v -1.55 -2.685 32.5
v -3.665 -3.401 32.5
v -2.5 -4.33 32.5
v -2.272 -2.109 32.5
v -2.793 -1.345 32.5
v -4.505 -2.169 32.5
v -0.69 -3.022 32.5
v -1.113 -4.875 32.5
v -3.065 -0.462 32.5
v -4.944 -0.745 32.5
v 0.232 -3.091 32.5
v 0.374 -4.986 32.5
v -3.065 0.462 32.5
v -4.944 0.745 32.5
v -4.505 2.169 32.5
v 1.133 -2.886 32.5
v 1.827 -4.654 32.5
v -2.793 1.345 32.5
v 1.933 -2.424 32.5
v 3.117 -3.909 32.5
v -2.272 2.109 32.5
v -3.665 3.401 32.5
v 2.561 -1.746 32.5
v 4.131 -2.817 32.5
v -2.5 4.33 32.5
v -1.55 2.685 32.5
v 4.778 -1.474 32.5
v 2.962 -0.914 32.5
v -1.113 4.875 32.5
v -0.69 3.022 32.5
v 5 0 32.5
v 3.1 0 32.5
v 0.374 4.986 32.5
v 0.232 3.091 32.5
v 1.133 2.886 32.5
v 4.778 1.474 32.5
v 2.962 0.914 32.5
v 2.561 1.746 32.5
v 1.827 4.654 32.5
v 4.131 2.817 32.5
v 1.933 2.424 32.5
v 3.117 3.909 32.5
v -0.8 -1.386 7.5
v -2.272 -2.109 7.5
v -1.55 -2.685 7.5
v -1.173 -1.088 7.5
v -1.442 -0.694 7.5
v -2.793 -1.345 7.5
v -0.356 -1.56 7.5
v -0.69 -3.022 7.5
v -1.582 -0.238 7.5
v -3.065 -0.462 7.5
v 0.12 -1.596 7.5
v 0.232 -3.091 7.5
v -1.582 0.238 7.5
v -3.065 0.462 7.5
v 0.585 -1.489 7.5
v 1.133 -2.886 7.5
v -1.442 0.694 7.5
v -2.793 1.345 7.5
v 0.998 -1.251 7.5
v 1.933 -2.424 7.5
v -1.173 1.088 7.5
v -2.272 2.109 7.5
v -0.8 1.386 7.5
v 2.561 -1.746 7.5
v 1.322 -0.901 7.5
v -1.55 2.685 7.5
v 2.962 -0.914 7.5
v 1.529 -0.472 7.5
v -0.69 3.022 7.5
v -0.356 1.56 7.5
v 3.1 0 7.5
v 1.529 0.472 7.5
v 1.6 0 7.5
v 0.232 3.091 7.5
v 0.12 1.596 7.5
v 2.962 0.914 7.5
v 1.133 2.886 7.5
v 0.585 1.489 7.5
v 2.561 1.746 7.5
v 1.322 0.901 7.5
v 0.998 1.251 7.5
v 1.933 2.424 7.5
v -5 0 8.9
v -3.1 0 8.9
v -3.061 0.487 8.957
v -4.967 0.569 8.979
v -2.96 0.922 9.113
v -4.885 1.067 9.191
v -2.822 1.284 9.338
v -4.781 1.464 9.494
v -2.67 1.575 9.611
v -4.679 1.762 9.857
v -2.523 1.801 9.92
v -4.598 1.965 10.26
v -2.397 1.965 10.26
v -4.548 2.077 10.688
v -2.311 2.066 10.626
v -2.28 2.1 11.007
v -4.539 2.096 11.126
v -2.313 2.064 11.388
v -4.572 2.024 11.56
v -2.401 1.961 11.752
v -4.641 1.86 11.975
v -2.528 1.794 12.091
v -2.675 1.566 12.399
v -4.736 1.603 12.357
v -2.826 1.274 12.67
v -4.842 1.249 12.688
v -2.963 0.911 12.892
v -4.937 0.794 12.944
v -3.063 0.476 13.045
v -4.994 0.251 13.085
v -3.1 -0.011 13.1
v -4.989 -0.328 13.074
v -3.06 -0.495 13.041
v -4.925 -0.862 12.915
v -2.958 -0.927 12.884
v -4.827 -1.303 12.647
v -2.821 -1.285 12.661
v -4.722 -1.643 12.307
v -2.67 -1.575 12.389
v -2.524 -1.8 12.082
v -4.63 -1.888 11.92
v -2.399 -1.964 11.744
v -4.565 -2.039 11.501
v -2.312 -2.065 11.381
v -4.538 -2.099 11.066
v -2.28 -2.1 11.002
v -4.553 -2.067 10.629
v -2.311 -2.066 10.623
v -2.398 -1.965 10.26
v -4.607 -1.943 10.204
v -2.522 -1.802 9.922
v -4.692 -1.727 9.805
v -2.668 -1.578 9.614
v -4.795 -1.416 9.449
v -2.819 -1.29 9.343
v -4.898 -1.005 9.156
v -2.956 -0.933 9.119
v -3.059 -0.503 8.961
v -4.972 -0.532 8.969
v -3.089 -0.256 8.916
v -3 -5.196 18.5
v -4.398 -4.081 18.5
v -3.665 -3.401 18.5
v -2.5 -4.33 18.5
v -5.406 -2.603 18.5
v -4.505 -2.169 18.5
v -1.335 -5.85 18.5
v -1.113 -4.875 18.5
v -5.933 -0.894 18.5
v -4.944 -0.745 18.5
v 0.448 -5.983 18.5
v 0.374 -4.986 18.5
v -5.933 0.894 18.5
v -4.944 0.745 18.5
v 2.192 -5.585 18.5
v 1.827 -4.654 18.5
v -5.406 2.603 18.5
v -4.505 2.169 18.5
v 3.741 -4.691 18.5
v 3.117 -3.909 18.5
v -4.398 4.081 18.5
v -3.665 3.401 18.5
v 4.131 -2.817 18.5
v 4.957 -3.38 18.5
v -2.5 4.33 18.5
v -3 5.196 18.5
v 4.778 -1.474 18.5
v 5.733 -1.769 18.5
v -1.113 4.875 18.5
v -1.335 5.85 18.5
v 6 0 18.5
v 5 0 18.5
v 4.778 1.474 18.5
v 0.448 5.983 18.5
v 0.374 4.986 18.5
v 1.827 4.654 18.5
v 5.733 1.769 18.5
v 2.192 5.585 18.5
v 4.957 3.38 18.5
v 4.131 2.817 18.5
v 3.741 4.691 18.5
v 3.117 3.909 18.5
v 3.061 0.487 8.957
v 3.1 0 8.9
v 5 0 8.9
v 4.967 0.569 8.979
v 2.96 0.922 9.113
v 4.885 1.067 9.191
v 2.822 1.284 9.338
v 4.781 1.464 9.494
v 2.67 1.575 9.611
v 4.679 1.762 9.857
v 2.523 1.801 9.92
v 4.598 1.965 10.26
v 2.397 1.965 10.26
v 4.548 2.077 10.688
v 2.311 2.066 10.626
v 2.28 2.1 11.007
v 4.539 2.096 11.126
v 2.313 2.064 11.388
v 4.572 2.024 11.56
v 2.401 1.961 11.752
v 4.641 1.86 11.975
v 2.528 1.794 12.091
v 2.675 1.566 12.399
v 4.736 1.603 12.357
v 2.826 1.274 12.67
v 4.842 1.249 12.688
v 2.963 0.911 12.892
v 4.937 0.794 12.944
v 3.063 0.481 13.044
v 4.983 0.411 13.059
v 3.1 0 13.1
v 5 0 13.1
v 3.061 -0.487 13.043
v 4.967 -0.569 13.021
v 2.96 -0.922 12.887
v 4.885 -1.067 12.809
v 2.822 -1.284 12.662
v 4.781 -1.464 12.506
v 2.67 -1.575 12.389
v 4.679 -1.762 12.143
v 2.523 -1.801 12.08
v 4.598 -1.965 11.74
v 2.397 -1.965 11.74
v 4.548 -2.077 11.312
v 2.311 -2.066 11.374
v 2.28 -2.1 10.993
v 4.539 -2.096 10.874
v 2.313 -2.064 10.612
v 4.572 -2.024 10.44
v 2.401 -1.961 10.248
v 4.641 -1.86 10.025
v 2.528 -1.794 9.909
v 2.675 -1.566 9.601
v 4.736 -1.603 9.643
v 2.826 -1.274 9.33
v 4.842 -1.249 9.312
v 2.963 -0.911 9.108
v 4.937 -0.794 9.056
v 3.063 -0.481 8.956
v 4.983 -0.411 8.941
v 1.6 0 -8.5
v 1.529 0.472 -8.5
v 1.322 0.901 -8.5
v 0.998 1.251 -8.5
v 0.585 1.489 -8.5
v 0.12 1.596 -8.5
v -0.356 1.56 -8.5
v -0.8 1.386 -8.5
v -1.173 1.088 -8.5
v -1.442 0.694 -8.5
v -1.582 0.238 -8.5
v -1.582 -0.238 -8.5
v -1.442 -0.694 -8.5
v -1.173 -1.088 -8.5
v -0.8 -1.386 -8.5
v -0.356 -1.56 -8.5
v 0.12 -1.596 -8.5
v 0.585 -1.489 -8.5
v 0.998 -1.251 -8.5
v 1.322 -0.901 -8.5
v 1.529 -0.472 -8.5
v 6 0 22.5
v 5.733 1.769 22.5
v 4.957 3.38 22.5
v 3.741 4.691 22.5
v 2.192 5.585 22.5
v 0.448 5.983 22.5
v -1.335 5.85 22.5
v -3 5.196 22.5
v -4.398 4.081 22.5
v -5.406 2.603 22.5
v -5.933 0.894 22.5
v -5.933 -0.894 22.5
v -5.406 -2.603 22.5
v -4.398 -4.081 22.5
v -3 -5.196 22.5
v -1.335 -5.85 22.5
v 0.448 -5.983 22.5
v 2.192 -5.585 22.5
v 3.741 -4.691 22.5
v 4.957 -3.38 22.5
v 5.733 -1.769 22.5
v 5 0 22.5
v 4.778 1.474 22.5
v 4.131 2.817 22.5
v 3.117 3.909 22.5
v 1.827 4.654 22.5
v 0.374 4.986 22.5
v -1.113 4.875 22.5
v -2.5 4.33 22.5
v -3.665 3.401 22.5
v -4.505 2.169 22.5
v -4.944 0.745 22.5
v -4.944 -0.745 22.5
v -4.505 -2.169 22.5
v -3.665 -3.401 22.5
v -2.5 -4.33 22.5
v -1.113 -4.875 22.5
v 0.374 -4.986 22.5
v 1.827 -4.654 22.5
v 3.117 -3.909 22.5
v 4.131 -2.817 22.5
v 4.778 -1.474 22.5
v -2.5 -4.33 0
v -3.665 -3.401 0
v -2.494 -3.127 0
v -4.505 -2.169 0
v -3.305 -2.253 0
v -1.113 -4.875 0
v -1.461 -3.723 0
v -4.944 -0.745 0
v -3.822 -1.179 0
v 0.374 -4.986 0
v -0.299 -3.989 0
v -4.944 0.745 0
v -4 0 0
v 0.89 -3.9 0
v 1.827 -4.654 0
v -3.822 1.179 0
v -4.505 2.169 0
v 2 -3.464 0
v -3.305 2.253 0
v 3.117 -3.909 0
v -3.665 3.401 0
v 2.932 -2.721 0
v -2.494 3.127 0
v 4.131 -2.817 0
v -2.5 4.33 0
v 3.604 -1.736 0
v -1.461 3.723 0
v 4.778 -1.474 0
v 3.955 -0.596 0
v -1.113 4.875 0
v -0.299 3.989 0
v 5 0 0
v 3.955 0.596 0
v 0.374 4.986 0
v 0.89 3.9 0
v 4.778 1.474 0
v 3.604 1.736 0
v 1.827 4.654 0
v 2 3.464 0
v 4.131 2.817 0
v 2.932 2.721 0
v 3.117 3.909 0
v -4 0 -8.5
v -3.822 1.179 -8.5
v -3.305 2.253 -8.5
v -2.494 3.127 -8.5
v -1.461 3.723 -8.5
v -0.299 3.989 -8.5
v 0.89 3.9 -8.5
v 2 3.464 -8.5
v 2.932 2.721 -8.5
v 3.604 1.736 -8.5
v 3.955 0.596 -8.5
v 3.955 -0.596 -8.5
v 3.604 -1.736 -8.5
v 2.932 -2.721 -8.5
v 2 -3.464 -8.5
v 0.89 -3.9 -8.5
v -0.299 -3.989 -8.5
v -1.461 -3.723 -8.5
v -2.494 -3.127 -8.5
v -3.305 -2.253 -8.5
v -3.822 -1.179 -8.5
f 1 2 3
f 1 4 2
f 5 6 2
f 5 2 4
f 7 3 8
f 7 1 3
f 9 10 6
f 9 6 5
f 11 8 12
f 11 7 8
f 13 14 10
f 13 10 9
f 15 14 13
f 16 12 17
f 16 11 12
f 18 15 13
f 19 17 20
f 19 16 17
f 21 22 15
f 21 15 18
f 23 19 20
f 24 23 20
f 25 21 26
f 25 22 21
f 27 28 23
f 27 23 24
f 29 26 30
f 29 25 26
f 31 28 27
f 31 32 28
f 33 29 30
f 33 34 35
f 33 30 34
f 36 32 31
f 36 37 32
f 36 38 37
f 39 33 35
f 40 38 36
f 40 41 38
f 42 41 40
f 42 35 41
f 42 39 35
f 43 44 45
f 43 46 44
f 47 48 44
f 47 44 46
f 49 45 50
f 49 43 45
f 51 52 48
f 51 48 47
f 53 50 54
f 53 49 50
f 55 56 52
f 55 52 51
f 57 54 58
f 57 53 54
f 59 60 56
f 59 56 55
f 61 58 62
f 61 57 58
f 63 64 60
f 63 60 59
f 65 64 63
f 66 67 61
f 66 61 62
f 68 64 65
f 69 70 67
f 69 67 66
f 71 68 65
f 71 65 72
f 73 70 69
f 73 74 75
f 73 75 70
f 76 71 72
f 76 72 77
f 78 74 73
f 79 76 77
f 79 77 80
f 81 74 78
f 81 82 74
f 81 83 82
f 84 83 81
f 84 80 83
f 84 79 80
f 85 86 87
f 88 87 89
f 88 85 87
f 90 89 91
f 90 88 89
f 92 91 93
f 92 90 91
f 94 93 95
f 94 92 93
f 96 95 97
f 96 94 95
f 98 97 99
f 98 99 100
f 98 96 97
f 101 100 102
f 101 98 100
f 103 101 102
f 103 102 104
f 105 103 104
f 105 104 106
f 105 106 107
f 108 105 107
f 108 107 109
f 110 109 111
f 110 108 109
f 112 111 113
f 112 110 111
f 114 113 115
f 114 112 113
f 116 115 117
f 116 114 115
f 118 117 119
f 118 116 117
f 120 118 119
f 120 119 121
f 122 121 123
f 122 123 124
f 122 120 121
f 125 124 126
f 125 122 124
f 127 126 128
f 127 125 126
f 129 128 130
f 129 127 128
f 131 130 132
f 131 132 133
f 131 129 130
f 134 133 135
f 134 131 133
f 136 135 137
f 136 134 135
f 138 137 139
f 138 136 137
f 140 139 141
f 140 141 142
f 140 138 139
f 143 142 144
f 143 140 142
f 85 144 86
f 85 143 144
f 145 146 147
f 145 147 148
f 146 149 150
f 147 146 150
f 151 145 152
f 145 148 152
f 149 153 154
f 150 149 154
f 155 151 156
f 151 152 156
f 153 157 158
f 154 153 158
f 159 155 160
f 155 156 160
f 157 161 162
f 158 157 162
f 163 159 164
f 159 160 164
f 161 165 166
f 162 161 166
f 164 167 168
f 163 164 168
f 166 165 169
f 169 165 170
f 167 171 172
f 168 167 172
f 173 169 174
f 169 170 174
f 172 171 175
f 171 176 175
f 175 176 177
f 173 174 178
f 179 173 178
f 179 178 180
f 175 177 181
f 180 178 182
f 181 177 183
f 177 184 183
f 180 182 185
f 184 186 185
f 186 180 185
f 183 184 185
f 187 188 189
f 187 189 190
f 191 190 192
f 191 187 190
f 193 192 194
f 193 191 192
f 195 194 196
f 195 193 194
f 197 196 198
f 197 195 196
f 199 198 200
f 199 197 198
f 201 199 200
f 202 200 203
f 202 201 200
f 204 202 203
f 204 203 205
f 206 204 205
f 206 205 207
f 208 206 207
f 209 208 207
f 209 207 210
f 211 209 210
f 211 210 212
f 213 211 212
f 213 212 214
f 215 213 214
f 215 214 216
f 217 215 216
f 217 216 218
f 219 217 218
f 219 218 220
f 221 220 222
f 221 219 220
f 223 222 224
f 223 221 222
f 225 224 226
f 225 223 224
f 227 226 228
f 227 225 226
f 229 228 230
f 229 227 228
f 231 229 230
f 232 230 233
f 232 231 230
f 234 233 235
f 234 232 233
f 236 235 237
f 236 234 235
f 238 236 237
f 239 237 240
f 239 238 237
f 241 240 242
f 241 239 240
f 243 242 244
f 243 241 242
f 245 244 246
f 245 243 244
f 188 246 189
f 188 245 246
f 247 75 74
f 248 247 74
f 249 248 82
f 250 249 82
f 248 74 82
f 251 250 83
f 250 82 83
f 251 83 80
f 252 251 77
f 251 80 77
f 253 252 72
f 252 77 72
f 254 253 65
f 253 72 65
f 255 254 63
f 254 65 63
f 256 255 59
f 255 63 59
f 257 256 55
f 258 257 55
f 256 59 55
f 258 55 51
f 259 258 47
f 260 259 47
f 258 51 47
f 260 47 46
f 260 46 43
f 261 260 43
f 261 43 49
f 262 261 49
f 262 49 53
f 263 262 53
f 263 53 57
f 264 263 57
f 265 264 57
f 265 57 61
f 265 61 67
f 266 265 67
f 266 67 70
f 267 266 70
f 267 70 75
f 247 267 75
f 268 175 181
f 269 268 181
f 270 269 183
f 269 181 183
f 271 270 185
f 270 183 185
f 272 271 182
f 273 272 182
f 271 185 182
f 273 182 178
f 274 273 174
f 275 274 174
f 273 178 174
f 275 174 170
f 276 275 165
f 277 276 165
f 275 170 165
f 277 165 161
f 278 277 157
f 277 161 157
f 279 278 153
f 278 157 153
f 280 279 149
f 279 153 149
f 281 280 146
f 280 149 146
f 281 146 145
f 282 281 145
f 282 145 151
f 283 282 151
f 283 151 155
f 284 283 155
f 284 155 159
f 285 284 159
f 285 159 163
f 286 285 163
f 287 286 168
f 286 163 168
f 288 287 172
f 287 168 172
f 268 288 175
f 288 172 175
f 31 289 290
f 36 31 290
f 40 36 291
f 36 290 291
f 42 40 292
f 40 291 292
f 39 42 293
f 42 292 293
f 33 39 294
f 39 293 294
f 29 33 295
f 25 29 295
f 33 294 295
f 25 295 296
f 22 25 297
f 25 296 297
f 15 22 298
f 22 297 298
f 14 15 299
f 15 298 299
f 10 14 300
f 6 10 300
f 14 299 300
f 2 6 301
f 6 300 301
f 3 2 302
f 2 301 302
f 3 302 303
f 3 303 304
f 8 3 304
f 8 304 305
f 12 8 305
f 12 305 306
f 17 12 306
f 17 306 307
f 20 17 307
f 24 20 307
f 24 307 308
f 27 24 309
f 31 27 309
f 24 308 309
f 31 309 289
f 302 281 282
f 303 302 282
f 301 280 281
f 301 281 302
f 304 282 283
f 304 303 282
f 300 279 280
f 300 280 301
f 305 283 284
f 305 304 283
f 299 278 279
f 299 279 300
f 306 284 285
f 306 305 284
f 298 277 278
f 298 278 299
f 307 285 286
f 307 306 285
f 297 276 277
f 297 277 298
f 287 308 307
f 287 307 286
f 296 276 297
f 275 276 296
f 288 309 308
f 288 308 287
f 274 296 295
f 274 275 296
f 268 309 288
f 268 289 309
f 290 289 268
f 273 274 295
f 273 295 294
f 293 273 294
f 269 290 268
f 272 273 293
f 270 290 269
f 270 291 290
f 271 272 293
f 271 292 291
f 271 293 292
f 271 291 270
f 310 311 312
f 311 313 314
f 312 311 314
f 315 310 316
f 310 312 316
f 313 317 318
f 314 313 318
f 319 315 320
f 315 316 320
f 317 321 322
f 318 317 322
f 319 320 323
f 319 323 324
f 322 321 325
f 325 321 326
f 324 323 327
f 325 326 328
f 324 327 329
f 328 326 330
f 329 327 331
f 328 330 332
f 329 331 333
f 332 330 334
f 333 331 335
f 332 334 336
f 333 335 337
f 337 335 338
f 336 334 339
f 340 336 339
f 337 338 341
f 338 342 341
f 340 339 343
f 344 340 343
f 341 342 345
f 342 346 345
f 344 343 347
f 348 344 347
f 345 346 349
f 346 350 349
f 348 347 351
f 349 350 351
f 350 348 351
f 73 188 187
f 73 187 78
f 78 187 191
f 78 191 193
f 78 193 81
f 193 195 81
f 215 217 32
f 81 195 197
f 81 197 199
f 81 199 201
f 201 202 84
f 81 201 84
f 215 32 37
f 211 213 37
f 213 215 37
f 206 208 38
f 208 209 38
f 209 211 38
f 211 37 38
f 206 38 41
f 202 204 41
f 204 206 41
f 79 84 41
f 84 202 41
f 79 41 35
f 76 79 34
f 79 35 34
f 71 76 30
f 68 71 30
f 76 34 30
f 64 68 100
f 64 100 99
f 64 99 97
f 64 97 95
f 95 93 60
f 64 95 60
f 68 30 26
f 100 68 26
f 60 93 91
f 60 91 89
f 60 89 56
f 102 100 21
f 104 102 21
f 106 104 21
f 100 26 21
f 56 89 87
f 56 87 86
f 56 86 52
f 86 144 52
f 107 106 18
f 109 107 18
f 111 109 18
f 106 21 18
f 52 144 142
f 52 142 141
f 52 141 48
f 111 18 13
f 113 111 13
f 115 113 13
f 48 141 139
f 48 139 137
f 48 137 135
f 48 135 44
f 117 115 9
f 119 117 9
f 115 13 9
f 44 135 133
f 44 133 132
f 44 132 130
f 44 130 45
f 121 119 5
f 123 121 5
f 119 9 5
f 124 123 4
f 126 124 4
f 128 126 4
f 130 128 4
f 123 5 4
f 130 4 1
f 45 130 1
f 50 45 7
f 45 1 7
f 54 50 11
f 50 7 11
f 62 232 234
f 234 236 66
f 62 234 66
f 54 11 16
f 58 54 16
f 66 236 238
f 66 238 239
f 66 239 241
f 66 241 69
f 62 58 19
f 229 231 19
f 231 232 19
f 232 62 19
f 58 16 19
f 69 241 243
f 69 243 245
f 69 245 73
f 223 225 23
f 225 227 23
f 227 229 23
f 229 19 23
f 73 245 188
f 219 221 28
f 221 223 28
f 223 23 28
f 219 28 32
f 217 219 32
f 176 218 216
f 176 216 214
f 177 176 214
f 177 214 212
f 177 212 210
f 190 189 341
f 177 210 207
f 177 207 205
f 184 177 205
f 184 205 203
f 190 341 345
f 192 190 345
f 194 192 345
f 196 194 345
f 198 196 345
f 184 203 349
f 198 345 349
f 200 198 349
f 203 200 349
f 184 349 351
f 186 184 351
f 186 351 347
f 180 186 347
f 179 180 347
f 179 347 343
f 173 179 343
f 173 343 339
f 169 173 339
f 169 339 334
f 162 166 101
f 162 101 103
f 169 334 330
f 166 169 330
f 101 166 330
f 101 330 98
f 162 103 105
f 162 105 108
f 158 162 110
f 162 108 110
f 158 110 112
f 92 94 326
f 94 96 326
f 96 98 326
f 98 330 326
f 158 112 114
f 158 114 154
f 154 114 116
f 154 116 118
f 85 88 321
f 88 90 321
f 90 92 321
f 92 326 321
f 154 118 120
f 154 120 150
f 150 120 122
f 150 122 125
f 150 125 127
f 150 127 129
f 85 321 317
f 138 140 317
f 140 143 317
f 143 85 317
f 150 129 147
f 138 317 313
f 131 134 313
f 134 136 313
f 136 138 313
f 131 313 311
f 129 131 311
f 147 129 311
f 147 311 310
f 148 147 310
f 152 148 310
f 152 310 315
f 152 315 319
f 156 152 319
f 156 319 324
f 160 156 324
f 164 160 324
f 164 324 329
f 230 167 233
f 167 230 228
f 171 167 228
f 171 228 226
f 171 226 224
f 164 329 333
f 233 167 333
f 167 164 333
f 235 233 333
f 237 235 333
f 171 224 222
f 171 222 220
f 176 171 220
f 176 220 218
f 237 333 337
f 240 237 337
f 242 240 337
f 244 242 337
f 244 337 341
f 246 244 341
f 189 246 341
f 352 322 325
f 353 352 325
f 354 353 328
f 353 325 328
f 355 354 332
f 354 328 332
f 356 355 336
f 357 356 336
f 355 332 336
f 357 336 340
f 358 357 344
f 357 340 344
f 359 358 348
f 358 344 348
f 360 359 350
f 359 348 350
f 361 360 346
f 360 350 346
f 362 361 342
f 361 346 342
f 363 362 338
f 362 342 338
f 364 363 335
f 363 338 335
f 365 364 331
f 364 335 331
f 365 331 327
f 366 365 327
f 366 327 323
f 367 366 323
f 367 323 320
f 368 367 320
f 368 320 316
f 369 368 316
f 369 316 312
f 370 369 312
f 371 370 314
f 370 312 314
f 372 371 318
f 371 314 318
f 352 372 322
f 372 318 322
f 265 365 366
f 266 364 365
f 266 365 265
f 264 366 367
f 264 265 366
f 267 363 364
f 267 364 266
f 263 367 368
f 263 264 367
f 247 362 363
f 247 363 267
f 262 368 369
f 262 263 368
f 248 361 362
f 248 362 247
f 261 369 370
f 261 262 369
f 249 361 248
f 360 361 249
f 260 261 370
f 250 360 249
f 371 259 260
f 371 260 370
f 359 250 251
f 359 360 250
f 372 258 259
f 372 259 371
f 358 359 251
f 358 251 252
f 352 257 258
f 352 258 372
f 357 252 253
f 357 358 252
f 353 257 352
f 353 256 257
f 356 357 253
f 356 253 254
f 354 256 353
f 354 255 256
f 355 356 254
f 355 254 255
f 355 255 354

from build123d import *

# Parameters (mm, degrees)
SKETCH_1_R               = 5
EXTRUDE_1_DEPTH          = 18.5
SKETCH_2_R               = 6
EXTRUDE_2_DEPTH          = 4
SKETCH_3_R               = 5
EXTRUDE_3_DEPTH          = 10
SKETCH_5_R               = 3.1
CUT_EXTRUDE_2_DEPTH      = 25
CUT_EXTRUDE_3_DEPTH      = 34.589432862
CUT_EXTRUDE_3_DEPTH_BACK = 34.589432862
SKETCH_6_R               = 2.1
SKETCH_7_R               = 4
EXTRUDE_4_DEPTH          = 8.5
SKETCH_4_R               = 1.6
CUT_EXTRUDE_1_DEPTH      = 42.868842831


with BuildPart() as part:
    # ｽｹｯﾁ1 → ﾎﾞｽ - 押し出し1 (new body)
    with BuildSketch(Plane.XY):
        Circle(SKETCH_1_R)
    extrude(amount=EXTRUDE_1_DEPTH)

    # ｽｹｯﾁ2 → ﾎﾞｽ - 押し出し2 (add)
    with BuildSketch(Plane.XY.offset(18.5)):
        Circle(SKETCH_2_R)
    extrude(amount=EXTRUDE_2_DEPTH)

    # ｽｹｯﾁ3 → ﾎﾞｽ - 押し出し3 (add)
    with BuildSketch(Plane.XY.offset(22.5)):
        Circle(SKETCH_3_R)
    extrude(amount=EXTRUDE_3_DEPTH)

    # ｽｹｯﾁ5 → ｶｯﾄ - 押し出し2 (cut)
    with BuildSketch(Plane.XY.offset(32.5)):
        Circle(SKETCH_5_R)
    extrude(amount=-CUT_EXTRUDE_2_DEPTH, mode=Mode.SUBTRACT)

    # ｽｹｯﾁ6 → ｶｯﾄ - 押し出し3 (cut, two sides: drawn at the far end of the back side and taken through both)
    with BuildSketch(Plane(origin=(0, 0, 0), x_dir=(0, 0, -1), z_dir=(1, 0, 0)).offset(-CUT_EXTRUDE_3_DEPTH_BACK)):
        with Locations((-11, 0)):
            Circle(SKETCH_6_R)
    extrude(amount=CUT_EXTRUDE_3_DEPTH + CUT_EXTRUDE_3_DEPTH_BACK, mode=Mode.SUBTRACT)

    # ｽｹｯﾁ7 → ﾎﾞｽ - 押し出し4 (add)
    with BuildSketch(Plane(origin=(0, 0, 0), x_dir=(-1, 0, 0), z_dir=(0, 0, -1))):
        Circle(SKETCH_7_R)
    extrude(amount=EXTRUDE_4_DEPTH)

    # ｽｹｯﾁ4 → ｶｯﾄ - 押し出し1 (cut, through all)
    with BuildSketch(Plane.XY.offset(32.5)):
        Circle(SKETCH_4_R)
    extrude(amount=-CUT_EXTRUDE_1_DEPTH, mode=Mode.SUBTRACT)


solid = part.part
